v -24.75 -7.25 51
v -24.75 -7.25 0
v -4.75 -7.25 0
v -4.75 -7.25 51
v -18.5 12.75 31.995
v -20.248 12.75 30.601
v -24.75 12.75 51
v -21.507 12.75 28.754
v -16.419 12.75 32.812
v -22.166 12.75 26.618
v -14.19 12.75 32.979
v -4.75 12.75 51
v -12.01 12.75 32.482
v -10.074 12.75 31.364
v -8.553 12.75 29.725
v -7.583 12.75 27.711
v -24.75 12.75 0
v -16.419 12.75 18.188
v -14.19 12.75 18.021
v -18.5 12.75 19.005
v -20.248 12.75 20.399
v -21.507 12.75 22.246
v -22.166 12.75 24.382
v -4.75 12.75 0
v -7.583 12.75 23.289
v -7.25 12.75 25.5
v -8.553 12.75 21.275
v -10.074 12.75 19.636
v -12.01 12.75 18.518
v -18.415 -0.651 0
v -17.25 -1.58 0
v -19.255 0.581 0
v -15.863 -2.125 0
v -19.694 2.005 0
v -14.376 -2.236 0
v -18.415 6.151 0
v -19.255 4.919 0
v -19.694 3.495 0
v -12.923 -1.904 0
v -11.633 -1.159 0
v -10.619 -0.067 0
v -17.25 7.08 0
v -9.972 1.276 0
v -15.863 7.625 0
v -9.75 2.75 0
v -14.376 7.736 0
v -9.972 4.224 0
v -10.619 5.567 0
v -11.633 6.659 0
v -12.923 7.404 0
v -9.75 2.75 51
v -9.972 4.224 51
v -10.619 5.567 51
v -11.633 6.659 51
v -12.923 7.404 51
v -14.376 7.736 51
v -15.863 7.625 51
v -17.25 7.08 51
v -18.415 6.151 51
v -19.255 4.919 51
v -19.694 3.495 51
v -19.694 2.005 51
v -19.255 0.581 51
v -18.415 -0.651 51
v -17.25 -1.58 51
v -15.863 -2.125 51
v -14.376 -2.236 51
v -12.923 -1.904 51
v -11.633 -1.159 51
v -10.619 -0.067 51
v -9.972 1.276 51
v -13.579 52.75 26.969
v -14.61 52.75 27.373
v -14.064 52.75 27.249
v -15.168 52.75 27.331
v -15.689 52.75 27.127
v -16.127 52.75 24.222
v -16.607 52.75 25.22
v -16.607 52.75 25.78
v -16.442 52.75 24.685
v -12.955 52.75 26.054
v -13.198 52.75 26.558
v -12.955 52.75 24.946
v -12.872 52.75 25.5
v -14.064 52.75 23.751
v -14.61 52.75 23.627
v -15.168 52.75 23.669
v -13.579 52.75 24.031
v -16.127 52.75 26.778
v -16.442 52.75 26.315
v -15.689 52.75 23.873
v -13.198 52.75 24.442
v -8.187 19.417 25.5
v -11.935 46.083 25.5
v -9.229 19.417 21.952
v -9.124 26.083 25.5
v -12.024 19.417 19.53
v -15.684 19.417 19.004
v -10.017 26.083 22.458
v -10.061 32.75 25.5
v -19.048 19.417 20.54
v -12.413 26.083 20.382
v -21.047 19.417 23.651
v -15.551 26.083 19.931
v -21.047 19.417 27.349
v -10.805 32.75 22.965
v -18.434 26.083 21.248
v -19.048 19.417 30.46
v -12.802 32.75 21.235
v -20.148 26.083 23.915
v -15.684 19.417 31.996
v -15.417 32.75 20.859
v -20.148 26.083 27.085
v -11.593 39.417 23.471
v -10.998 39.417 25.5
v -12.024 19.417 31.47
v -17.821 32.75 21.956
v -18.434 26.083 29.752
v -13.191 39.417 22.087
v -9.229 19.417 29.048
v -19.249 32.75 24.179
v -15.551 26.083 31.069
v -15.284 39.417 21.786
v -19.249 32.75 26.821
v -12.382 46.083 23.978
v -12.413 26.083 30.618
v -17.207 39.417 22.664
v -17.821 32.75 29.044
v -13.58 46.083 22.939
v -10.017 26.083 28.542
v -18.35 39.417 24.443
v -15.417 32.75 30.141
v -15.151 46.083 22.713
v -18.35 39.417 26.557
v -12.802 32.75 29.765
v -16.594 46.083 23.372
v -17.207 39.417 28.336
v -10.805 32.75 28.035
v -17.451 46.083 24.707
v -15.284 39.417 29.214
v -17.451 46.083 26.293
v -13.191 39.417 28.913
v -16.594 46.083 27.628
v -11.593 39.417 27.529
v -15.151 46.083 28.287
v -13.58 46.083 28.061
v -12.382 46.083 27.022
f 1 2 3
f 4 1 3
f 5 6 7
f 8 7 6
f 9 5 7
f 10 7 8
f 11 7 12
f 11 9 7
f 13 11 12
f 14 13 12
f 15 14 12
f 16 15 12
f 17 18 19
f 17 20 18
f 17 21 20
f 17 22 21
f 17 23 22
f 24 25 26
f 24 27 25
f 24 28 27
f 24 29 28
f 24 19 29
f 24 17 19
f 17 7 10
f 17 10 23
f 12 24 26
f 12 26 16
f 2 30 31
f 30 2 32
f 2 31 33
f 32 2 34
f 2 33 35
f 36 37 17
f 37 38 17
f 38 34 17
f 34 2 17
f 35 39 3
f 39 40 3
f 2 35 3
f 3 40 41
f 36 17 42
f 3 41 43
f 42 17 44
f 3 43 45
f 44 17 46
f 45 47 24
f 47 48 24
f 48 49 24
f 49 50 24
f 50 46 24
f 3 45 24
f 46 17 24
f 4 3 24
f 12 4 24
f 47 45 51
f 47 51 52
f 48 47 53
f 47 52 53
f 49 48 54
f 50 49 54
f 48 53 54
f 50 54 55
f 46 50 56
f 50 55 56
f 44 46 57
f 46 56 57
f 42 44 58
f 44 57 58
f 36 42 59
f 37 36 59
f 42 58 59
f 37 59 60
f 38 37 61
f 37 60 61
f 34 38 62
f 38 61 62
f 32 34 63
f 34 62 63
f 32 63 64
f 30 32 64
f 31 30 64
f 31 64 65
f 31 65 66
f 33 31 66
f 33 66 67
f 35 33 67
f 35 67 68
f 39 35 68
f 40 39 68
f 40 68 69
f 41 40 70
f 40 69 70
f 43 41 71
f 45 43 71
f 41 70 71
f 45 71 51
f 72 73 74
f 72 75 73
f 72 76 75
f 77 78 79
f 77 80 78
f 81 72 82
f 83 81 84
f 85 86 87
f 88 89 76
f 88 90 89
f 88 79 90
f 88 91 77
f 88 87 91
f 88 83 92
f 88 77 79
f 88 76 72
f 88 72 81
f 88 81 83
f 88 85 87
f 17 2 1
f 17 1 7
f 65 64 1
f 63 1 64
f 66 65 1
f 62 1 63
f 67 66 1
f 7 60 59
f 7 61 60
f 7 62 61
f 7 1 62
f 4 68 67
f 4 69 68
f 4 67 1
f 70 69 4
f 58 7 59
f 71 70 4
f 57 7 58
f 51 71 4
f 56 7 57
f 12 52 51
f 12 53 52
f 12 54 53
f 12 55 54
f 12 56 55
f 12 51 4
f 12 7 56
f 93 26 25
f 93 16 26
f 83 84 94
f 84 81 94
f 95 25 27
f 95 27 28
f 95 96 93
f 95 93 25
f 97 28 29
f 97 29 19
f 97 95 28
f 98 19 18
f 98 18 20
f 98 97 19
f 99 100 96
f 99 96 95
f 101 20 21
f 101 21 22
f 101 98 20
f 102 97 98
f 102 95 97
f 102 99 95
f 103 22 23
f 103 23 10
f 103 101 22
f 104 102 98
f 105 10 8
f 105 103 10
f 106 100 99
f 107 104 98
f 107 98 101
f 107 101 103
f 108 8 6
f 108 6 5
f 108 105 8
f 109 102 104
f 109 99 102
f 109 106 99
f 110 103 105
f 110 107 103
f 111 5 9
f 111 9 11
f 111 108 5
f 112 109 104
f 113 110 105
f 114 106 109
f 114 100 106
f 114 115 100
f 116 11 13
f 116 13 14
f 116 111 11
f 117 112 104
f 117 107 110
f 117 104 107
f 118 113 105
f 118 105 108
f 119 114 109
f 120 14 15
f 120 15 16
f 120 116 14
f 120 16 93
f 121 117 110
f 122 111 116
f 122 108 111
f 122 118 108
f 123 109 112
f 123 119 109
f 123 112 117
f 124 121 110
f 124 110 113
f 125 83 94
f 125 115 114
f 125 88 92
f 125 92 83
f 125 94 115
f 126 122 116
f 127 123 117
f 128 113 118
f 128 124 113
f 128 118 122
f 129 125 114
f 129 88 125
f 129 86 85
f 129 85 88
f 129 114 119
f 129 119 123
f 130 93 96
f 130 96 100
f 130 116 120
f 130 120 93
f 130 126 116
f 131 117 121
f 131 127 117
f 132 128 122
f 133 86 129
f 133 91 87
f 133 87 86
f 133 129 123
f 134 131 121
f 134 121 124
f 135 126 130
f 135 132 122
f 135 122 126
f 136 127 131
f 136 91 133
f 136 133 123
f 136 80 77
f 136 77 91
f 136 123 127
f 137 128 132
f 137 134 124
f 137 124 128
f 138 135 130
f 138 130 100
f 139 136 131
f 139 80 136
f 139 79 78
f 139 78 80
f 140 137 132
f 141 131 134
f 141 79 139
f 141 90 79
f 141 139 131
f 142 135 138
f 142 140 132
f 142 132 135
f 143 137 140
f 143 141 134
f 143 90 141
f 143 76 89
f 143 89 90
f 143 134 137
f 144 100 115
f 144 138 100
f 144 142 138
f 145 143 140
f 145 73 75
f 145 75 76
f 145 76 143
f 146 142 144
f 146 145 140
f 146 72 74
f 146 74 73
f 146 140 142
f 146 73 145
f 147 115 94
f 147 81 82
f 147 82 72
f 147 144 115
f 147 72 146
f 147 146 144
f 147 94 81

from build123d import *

# Parameters (mm, degrees)
SKETCH2_W           = 20
SKETCH2_H           = 20
BOSS_EXTRUDE1_DEPTH = 51
SKETCH3_R           = 5
CUT_EXTRUDE1_DEPTH  = 51
SKETCH4_R           = 7.5
BOSS_EXTRUDE2_DEPTH = 40
BOSS_EXTRUDE2_TAPER = 8


with BuildPart() as part:
    # Sketch2 → Boss-Extrude1 (new body)
    with BuildSketch(Plane.XY):
        with Locations((-14.75, 2.75)):
            Rectangle(SKETCH2_W, SKETCH2_H)
    extrude(amount=BOSS_EXTRUDE1_DEPTH)

    # Sketch3 → Cut-Extrude1 (cut)
    with BuildSketch(Plane.XY.offset(51)):
        with Locations((-14.75, 2.75)):
            Circle(SKETCH3_R)
    extrude(amount=-CUT_EXTRUDE1_DEPTH, mode=Mode.SUBTRACT)

    # Sketch4 → Boss-Extrude2 (add)
    with BuildSketch(Plane(origin=(0, 12.75, 0), x_dir=(1, 0, 0), z_dir=(0, 1, 0))):
        with Locations((-14.75, -25.5)):
            Circle(SKETCH4_R)
    extrude(amount=BOSS_EXTRUDE2_DEPTH, taper=BOSS_EXTRUDE2_TAPER)


solid = part.part
